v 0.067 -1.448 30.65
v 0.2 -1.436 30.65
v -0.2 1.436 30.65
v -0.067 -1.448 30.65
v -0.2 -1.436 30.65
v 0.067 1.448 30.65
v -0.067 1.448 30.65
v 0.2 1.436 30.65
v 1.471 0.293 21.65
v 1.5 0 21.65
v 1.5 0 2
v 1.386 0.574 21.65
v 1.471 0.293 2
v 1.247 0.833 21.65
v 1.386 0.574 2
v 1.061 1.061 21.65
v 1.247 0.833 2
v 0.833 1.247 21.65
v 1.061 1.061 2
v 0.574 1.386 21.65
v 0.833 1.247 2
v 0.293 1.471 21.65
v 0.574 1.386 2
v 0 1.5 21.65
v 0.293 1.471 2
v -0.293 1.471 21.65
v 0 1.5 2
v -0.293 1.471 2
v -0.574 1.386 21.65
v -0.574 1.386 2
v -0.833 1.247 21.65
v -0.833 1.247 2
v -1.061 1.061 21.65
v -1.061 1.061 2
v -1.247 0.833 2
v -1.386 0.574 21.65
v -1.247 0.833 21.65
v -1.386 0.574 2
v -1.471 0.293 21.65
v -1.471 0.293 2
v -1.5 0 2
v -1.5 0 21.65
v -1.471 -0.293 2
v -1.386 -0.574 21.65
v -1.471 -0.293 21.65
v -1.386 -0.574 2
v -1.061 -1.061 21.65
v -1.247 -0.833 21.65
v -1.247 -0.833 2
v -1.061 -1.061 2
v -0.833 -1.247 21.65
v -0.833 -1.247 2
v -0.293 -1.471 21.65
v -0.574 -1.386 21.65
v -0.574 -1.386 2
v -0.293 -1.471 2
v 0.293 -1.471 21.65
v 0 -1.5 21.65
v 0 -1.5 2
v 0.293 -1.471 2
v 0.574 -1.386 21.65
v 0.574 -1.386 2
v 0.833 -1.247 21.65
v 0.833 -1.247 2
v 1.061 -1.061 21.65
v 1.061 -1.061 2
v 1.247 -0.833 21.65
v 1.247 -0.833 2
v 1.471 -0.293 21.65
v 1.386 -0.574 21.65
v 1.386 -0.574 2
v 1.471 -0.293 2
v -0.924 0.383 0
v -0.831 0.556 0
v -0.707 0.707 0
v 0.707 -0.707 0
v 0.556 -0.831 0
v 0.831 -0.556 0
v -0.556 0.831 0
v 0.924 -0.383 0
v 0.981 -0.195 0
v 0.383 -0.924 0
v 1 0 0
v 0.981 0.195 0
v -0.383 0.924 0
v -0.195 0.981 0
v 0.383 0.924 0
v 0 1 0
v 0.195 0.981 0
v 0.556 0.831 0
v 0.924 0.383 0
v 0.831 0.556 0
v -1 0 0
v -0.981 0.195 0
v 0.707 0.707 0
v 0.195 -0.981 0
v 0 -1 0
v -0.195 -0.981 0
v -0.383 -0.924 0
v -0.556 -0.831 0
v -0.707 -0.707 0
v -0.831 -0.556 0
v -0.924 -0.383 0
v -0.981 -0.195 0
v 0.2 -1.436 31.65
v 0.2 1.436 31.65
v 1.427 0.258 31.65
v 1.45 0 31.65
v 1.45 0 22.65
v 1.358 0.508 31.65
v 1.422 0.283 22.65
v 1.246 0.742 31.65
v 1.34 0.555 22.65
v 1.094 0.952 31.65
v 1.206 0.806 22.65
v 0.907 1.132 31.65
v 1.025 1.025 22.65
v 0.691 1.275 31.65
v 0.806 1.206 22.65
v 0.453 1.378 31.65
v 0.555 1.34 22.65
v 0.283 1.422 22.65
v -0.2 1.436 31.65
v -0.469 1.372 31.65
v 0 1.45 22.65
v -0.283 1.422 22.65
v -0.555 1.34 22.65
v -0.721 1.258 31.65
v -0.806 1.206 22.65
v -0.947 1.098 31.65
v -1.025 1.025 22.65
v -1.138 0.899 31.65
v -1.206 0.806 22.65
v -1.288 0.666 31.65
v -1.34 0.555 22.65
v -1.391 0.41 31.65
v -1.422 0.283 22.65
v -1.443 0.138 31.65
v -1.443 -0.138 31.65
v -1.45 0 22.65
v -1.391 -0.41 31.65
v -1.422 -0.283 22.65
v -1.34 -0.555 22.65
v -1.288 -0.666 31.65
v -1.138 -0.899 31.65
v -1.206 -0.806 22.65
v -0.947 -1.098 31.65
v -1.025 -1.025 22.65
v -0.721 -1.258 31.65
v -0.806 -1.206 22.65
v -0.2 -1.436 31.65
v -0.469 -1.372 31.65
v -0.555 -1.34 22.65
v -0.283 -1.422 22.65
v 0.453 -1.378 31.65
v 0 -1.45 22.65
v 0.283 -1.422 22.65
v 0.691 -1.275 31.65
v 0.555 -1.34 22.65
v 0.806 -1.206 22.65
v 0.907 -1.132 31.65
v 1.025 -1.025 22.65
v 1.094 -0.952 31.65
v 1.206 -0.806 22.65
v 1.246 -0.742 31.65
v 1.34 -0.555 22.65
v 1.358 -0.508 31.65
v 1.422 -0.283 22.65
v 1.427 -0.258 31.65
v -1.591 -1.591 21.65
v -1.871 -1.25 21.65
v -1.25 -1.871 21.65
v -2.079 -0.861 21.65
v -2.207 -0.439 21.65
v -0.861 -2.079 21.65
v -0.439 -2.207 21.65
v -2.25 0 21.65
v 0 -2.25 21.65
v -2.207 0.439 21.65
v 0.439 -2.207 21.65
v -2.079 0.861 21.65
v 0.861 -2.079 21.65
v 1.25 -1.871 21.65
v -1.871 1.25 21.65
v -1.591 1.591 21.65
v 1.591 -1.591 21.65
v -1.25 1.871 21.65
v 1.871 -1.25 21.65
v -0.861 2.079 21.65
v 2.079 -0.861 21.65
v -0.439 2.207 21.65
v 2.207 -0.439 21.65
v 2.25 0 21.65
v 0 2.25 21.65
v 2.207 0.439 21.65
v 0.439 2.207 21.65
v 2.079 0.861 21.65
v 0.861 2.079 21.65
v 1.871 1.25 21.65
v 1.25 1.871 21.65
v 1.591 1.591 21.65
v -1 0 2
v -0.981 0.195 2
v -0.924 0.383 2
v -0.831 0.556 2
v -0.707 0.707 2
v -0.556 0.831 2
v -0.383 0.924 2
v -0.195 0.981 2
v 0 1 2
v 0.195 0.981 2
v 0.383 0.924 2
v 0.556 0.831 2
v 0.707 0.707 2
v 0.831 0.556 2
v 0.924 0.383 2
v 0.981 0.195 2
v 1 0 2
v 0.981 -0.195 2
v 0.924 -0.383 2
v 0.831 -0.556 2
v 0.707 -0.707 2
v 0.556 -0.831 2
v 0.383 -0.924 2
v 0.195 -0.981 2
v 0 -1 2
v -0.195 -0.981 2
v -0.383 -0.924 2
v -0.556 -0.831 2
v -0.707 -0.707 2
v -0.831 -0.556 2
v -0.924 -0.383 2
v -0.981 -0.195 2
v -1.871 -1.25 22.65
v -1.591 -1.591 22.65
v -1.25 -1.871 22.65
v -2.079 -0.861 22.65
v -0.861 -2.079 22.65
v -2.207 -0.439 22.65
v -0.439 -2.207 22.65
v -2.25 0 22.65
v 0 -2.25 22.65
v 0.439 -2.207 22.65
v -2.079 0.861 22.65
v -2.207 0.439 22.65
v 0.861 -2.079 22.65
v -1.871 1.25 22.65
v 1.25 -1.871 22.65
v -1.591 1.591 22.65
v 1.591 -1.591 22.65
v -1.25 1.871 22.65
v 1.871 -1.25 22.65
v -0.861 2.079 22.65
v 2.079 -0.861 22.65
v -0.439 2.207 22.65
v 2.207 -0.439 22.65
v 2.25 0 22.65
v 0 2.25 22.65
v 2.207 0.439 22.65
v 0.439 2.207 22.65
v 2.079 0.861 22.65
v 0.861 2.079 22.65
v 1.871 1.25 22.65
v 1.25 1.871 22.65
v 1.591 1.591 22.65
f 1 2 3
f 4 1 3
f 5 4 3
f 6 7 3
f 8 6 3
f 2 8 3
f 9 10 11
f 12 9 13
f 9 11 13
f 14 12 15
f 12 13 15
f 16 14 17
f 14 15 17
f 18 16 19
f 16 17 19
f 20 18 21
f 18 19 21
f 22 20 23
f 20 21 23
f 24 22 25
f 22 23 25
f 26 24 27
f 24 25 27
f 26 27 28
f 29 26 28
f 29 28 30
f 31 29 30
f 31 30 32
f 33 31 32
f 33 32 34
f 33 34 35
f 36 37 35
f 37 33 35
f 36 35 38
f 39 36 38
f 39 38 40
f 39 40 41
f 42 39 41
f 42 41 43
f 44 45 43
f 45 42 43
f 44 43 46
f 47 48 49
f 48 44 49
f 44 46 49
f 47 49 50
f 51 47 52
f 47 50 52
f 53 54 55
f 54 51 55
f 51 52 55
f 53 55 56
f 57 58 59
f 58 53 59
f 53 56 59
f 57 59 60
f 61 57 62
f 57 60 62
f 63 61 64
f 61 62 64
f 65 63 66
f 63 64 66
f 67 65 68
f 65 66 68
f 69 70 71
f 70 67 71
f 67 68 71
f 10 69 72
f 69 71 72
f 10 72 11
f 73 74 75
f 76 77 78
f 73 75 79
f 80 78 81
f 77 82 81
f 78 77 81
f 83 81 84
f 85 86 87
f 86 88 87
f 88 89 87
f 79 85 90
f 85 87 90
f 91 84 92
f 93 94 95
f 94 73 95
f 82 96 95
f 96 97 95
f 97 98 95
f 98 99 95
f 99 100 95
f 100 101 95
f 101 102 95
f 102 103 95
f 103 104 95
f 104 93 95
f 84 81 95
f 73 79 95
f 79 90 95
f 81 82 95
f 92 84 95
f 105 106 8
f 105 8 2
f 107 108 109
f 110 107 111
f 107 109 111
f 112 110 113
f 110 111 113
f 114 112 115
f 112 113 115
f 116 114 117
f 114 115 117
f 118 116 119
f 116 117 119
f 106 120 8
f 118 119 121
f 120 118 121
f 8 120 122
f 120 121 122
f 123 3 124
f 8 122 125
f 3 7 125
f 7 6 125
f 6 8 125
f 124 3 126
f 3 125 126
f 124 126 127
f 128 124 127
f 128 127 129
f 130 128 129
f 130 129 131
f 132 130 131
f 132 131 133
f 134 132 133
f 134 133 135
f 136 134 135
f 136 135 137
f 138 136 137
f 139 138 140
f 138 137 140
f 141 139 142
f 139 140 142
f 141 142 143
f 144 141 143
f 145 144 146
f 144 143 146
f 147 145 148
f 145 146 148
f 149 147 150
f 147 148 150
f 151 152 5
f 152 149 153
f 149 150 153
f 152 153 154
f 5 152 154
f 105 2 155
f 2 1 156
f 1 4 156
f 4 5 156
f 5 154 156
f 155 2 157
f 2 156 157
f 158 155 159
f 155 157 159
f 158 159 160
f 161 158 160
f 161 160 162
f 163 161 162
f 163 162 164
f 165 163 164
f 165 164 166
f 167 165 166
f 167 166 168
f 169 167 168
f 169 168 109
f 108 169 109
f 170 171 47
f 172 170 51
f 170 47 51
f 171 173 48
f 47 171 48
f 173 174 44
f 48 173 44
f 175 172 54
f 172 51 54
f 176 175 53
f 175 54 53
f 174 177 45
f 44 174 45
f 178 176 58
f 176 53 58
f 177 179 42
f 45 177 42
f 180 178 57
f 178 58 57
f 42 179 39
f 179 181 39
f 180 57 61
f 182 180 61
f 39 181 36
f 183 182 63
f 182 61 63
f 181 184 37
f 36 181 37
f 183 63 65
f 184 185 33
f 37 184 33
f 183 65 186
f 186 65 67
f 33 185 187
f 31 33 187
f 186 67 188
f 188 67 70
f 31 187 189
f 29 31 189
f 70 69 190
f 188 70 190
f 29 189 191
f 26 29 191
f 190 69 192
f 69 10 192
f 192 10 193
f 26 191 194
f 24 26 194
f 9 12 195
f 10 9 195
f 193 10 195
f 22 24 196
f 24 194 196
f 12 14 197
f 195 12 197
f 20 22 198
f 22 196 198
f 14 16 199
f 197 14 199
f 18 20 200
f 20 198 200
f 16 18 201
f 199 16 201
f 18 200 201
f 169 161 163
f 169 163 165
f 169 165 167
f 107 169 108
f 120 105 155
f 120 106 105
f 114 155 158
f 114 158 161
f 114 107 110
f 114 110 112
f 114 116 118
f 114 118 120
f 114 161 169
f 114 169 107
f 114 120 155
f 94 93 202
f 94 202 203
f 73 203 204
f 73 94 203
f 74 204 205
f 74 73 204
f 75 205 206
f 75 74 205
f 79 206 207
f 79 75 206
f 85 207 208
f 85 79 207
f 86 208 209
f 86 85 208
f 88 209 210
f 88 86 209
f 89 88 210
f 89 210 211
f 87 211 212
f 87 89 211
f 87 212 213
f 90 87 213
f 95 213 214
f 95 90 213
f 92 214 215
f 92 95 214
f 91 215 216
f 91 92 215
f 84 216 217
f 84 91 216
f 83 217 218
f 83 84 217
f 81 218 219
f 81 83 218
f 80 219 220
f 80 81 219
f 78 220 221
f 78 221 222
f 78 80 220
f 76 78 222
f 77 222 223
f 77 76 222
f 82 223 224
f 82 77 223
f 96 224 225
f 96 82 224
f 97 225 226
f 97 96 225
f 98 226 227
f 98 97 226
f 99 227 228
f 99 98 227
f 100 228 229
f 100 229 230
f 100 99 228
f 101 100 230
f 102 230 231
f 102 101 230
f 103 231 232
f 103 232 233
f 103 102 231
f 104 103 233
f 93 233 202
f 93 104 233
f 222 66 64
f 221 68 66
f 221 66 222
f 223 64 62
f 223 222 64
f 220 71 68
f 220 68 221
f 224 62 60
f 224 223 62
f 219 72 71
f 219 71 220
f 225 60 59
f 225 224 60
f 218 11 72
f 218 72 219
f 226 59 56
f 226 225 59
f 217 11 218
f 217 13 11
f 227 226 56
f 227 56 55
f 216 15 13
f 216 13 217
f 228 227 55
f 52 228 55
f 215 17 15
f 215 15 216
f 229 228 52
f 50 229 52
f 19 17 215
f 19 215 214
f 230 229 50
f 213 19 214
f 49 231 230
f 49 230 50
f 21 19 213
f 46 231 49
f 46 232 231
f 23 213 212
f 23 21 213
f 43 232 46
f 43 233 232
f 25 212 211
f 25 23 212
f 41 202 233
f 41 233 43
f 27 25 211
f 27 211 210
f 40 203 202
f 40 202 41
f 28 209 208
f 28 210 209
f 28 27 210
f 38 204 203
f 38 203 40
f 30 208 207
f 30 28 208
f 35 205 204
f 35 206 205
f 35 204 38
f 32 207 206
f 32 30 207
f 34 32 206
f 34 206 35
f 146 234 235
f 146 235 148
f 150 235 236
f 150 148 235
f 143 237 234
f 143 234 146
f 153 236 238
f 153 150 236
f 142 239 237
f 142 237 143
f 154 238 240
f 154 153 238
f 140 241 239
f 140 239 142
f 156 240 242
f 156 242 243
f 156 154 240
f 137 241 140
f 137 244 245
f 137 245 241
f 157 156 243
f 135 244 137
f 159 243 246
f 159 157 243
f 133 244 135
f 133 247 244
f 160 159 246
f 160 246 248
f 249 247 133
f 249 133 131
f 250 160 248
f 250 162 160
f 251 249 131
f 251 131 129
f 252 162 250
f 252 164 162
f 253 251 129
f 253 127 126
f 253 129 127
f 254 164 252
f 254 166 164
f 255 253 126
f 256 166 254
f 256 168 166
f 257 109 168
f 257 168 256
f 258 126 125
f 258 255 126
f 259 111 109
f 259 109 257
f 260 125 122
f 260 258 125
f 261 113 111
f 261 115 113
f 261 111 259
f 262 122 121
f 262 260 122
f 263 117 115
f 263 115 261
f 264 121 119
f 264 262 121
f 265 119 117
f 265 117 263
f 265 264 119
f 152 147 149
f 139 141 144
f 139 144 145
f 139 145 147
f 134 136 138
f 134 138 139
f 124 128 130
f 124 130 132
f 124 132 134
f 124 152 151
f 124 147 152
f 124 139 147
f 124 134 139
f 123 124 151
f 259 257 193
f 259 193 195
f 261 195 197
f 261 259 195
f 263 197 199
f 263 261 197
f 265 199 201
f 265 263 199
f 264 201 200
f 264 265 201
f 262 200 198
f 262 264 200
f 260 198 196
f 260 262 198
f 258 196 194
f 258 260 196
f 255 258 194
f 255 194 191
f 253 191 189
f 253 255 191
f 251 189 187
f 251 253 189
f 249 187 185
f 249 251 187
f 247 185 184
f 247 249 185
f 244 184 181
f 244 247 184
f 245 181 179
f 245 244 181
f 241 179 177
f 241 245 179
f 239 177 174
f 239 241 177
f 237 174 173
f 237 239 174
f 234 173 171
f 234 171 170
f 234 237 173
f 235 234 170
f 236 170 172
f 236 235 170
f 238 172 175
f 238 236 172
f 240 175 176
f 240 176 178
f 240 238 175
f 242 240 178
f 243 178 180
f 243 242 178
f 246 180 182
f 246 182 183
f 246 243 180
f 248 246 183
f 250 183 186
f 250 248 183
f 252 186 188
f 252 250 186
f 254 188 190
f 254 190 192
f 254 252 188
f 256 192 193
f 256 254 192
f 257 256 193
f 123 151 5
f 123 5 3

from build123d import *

# Parameters (mm, degrees)
SKETCH_1_R          = 1.5
EXTRUDE_1_DEPTH     = 22.65
SKETCH_2_R          = 1.45
EXTRUDE_2_DEPTH     = 9
CUT_EXTRUDE_1_DEPTH = 1
SKETCH_4_R          = 1.5
SKETCH_4_R_2        = 1
CUT_EXTRUDE_2_DEPTH = 2
SKETCH_5_R          = 2.25
EXTRUDE_3_DEPTH     = 1


with BuildPart() as part:
    # 草图1 → 凸台-拉伸1 (new body)
    with BuildSketch(Plane.XY):
        Circle(SKETCH_1_R)
    extrude(amount=EXTRUDE_1_DEPTH)

    # 草图2 → 凸台-拉伸2 (add)
    with BuildSketch(Plane.XY.offset(22.65)):
        Circle(SKETCH_2_R)
    extrude(amount=EXTRUDE_2_DEPTH)

    # 草图3 → 切除-拉伸1 (cut)
    with BuildSketch(Plane.XY.offset(31.65)):
        with BuildLine():
            Line((-0.2, -1.486606875), (-0.2, 1.486606875))
            ThreePointArc((-0.2, 1.486606875), (0, 1.5), (0.2, 1.486606875))
            Line((0.2, 1.486606875), (0.2, -1.486606875))
            ThreePointArc((0.2, -1.486606875), (0, -1.5), (-0.2, -1.486606875))
        make_face()
    extrude(amount=-CUT_EXTRUDE_1_DEPTH, mode=Mode.SUBTRACT)

    # 草图4 → 切除-拉伸2 (cut)
    with BuildSketch(Plane(origin=(0, 0, 0), x_dir=(-1, 0, 0), z_dir=(0, 0, -1))):
        Circle(SKETCH_4_R)
        Circle(SKETCH_4_R_2, mode=Mode.SUBTRACT)
    extrude(amount=-CUT_EXTRUDE_2_DEPTH, mode=Mode.SUBTRACT)

    # 草图5 → 凸台-拉伸3 (add)
    with BuildSketch(Plane.XY.offset(22.65)):
        Circle(SKETCH_5_R)
    extrude(amount=-EXTRUDE_3_DEPTH)


solid = part.part
